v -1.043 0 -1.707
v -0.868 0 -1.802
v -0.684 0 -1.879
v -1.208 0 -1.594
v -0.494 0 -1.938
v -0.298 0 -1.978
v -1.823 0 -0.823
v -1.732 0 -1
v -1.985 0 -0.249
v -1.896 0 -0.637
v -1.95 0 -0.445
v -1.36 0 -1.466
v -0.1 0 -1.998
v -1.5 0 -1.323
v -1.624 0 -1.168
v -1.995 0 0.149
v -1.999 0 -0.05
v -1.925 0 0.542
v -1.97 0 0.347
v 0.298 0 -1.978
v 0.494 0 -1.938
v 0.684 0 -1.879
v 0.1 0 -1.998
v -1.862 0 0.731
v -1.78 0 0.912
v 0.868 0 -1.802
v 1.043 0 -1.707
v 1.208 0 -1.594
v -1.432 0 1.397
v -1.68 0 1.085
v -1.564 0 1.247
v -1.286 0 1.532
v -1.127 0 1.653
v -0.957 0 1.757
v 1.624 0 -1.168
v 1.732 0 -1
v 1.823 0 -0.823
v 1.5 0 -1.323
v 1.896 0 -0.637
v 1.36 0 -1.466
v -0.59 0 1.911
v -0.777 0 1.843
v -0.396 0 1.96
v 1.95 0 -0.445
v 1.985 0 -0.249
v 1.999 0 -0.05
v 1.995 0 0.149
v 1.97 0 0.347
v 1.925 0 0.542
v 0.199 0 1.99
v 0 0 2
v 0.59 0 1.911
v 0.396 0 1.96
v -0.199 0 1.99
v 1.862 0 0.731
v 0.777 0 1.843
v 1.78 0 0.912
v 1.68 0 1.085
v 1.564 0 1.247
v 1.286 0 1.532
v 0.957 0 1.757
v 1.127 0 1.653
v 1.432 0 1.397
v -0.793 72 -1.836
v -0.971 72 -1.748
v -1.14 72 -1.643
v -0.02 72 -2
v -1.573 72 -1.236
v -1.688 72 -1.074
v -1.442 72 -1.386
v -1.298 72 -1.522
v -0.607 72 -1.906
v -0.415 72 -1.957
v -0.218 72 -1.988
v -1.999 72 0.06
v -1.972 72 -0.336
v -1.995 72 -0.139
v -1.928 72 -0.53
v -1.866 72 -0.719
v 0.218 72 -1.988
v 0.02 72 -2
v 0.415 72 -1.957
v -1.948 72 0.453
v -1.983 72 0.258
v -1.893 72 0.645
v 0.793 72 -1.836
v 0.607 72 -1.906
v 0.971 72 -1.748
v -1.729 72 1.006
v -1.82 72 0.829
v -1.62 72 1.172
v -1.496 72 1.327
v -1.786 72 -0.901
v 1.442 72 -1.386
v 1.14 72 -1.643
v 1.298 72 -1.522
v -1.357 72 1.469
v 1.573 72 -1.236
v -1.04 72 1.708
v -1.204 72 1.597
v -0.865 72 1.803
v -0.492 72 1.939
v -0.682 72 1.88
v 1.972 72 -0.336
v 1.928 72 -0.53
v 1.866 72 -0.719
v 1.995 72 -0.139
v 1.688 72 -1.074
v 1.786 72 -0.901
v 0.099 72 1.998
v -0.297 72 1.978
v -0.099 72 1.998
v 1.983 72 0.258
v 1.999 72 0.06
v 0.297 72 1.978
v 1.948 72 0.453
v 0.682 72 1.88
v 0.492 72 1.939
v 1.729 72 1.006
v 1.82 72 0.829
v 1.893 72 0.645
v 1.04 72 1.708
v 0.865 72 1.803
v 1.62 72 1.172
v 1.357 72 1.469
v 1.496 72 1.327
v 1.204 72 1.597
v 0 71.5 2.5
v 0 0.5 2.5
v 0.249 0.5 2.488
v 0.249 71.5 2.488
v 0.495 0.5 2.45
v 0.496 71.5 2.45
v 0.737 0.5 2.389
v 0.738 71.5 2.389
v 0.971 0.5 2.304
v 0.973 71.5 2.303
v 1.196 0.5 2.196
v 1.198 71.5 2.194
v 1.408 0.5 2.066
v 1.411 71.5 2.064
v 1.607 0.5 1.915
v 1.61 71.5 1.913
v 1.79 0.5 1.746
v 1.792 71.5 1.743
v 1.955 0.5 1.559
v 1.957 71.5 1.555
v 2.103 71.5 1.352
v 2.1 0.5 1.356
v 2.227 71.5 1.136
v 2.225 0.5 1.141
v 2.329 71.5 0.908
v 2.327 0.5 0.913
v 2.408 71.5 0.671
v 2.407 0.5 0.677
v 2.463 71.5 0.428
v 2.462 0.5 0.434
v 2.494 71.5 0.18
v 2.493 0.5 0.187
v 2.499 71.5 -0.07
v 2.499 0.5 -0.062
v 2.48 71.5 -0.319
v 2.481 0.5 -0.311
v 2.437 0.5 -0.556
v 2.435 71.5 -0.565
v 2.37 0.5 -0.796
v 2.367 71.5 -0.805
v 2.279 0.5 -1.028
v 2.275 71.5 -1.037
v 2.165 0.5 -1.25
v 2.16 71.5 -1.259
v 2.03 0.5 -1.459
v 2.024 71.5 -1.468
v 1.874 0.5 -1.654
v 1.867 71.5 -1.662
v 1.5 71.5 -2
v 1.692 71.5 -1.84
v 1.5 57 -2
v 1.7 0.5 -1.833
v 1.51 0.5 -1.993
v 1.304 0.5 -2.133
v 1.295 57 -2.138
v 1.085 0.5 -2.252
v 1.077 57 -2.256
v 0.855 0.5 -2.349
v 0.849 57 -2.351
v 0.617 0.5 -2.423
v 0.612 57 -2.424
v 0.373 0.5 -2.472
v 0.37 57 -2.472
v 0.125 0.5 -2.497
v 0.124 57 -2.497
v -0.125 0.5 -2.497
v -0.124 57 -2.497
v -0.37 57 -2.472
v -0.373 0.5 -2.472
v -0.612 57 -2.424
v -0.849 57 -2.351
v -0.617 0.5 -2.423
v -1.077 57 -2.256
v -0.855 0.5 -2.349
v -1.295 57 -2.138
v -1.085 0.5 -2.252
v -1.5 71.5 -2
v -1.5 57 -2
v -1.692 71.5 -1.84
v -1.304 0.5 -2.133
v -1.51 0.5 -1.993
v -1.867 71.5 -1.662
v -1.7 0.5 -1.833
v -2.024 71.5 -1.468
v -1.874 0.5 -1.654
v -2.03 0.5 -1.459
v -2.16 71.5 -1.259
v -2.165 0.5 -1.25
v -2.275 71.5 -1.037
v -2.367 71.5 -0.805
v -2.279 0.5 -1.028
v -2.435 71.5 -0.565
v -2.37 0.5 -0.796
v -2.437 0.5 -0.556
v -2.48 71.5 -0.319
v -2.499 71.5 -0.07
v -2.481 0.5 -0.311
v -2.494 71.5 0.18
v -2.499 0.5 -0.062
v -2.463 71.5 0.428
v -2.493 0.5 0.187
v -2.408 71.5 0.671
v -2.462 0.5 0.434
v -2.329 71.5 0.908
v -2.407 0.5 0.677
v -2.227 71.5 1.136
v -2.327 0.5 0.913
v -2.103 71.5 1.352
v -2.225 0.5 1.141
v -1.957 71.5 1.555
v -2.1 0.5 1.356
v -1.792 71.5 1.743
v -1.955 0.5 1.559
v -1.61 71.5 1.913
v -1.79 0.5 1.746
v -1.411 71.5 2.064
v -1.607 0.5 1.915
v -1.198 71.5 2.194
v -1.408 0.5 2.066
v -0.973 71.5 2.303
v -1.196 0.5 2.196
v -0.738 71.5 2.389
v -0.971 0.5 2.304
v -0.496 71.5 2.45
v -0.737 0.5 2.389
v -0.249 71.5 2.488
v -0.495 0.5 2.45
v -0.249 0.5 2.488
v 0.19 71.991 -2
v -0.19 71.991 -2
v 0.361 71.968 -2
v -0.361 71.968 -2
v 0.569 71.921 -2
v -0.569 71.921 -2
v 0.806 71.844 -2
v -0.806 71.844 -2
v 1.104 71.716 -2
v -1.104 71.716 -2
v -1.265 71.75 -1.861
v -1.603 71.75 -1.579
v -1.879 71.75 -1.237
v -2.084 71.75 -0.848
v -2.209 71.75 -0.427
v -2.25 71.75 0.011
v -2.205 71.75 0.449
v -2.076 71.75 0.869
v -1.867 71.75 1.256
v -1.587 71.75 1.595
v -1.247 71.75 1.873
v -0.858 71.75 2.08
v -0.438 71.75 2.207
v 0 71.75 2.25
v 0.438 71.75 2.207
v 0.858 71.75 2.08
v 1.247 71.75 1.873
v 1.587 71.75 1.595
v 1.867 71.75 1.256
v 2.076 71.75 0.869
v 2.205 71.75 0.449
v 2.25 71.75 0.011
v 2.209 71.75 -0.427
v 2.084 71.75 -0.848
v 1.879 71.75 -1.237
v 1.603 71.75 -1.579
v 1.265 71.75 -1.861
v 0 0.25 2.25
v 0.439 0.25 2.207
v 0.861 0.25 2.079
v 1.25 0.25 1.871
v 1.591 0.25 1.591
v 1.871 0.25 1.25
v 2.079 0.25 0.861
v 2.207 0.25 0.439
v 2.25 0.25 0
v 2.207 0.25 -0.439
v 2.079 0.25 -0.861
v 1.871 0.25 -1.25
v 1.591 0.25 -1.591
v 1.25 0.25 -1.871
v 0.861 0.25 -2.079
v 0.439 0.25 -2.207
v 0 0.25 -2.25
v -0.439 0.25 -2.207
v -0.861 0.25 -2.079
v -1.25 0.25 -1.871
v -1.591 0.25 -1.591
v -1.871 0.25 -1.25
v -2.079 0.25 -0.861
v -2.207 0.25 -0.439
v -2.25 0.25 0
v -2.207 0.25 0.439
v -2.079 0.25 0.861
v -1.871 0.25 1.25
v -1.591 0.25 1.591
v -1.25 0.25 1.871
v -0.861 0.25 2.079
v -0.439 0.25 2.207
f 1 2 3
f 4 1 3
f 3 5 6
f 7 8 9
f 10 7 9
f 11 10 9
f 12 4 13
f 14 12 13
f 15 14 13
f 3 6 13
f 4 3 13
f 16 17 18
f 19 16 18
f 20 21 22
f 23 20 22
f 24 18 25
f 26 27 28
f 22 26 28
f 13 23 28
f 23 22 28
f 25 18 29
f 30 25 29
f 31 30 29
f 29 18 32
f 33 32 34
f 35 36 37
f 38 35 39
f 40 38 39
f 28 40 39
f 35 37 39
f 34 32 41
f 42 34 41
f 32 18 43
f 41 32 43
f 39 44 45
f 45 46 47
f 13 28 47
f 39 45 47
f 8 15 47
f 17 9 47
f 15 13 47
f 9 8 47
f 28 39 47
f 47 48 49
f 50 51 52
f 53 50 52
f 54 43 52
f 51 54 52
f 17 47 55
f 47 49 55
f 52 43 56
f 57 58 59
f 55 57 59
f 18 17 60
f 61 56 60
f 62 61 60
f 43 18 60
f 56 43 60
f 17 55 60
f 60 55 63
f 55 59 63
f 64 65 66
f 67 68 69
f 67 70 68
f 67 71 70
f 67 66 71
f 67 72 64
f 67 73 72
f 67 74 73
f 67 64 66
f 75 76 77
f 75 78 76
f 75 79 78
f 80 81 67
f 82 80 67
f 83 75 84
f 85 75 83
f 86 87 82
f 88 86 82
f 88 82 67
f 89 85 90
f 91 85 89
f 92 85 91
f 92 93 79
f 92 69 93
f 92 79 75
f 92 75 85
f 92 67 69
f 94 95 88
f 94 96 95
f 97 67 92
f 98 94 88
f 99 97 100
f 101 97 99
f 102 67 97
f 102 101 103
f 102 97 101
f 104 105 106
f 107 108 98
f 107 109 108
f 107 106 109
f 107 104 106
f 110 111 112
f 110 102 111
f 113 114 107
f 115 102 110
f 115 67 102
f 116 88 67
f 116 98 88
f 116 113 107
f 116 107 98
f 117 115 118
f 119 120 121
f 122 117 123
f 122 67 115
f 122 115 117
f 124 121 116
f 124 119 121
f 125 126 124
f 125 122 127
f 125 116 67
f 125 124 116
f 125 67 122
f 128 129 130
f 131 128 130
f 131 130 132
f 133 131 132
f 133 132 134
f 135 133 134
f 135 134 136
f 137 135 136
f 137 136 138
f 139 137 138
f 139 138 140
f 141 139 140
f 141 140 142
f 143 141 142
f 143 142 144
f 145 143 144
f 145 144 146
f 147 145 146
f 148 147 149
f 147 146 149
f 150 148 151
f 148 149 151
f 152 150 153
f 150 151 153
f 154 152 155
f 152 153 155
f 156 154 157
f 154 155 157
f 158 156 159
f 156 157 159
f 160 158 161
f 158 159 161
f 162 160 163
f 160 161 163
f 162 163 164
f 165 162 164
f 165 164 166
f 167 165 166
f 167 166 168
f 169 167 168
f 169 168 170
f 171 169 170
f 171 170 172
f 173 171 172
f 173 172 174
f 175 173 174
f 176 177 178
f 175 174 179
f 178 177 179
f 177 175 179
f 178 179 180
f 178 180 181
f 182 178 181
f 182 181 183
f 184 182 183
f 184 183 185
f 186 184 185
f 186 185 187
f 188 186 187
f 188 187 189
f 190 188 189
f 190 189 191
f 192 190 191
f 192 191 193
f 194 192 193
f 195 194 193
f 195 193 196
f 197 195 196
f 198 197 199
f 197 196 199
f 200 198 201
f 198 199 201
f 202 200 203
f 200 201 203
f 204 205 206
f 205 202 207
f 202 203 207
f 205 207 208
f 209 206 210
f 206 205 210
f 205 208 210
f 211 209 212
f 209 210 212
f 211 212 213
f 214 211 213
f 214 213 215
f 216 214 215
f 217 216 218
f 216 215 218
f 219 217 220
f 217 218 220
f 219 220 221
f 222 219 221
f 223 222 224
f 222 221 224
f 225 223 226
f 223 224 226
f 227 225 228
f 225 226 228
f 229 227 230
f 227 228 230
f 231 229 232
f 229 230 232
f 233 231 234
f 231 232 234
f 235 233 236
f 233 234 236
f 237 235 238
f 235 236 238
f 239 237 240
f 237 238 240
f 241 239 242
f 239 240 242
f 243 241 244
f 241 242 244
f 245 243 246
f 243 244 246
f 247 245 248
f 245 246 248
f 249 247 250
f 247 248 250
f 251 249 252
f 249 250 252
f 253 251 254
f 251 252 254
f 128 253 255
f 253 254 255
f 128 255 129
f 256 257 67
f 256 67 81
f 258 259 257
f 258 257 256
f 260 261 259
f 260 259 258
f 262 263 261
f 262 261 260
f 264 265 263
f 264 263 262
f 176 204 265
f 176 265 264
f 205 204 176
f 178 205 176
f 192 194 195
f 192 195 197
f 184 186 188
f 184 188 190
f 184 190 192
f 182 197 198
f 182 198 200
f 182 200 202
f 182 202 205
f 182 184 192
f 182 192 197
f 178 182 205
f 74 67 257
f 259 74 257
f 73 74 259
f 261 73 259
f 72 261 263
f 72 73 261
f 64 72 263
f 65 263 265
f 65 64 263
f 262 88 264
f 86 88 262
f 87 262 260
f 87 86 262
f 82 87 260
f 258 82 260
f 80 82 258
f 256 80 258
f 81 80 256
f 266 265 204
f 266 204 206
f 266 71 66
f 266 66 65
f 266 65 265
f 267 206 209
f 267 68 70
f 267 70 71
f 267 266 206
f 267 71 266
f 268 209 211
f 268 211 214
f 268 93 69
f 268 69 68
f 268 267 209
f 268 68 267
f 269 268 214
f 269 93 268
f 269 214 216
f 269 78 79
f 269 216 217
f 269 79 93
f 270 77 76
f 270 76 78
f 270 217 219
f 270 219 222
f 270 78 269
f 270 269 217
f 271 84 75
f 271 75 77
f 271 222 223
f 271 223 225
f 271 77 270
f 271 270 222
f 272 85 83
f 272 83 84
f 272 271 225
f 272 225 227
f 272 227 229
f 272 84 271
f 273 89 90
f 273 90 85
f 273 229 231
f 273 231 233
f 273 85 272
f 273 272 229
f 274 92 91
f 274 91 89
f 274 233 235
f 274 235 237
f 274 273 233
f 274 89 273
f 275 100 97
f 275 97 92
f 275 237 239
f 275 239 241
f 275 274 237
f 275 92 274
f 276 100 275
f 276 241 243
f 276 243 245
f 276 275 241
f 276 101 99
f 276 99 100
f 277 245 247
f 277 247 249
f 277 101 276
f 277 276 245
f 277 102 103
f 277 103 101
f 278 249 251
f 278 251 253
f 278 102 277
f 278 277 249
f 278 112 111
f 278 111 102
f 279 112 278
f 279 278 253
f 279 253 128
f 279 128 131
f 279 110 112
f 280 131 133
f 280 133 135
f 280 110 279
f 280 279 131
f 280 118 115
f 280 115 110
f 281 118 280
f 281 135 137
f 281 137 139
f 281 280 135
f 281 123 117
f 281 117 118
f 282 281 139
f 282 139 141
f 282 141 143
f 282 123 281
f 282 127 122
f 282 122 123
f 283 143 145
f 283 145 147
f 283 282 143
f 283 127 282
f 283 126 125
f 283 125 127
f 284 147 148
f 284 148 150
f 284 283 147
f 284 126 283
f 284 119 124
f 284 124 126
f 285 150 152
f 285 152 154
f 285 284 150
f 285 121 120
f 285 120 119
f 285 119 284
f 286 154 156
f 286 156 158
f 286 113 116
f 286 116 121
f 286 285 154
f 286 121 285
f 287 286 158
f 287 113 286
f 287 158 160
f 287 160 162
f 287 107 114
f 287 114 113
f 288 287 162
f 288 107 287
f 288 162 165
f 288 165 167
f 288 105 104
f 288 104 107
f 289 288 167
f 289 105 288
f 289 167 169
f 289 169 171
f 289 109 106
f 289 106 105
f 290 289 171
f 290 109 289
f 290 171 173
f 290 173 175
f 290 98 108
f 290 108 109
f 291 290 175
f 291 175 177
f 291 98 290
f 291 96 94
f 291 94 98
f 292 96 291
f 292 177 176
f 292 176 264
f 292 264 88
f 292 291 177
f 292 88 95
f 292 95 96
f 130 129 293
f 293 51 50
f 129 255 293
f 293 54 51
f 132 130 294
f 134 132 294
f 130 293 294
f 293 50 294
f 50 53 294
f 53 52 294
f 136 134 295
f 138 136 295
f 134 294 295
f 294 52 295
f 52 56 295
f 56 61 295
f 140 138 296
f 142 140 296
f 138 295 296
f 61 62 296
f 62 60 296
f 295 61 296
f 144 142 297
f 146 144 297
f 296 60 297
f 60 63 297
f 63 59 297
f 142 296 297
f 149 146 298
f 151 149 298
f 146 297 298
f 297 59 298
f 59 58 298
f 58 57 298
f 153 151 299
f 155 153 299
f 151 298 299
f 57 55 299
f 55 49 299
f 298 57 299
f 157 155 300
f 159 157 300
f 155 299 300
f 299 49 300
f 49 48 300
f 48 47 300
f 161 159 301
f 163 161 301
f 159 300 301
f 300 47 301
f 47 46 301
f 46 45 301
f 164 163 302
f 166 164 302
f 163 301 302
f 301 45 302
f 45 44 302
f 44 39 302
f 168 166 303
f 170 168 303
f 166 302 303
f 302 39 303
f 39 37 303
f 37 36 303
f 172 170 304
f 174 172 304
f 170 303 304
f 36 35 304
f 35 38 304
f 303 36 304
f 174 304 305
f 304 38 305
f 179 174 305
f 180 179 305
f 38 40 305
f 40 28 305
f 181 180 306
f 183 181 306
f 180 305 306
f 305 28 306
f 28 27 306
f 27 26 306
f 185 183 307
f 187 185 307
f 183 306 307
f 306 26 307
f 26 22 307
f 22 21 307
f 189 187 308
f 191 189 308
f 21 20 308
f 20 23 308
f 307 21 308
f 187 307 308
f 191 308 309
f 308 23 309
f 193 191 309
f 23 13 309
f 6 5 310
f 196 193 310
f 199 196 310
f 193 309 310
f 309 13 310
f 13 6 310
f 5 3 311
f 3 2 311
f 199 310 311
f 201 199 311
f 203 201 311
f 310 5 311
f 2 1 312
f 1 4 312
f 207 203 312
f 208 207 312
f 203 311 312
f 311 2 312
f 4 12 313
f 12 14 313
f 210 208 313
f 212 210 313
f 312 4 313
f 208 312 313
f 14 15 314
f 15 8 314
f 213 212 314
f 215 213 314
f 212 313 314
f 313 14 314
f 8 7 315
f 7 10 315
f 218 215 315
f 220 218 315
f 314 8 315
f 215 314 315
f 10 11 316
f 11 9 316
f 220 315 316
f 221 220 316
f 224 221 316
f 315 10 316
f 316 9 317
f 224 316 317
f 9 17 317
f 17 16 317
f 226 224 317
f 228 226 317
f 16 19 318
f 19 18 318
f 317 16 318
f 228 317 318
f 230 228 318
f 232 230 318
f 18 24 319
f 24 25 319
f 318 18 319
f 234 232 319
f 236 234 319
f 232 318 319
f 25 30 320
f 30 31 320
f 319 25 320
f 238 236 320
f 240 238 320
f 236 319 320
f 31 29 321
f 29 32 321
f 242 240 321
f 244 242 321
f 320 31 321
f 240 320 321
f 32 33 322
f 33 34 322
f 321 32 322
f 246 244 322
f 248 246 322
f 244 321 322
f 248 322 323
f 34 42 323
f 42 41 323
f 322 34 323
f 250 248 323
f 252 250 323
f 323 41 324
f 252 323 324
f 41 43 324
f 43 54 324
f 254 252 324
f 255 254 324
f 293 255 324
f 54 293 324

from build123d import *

# Parameters (mm, degrees)
SKETCH_1_R          = 2.5
EXTRUDE_1_DEPTH     = 72
CUT_EXTRUDE_START   = -15
CUT_EXTRUDE_1_DEPTH = 15
CHAMFER_1_SIZE      = 0.5


with BuildPart() as part:
    # Эскиз1 → Бобышка-Вытянуть1 (new body)
    with BuildSketch(Plane(origin=(0, 0, 0), x_dir=(1, 0, 0), z_dir=(0, 1, 0))):
        with Locations(Location((0, 0, 0), (0, 0, 270))):
            Circle(SKETCH_1_R)
    extrude(amount=EXTRUDE_1_DEPTH)

    # Эскиз2 → Вырез-Вытянуть1 (cut)
    with BuildSketch(Plane(origin=(0, 72, 0), x_dir=(1, 0, 0), z_dir=(0, 1, 0)).offset(CUT_EXTRUDE_START)):
        with BuildLine():
            Line((-1.5, 2), (1.5, 2))
            ThreePointArc((1.5, 2), (0, 2.5), (-1.5, 2))
        make_face()
    extrude(amount=CUT_EXTRUDE_1_DEPTH, mode=Mode.SUBTRACT)

    # Фаска1
    chamfer_1_edges = [part.edges().sort_by_distance(p)[0] for p in [
        (-2.371708245, 72, 0.790569415),
        (0, 0, -2.5),
    ]]
    chamfer(chamfer_1_edges, length=CHAMFER_1_SIZE - 0.0001)  # a hair under: the kernel refuses the full size


solid = part.part
